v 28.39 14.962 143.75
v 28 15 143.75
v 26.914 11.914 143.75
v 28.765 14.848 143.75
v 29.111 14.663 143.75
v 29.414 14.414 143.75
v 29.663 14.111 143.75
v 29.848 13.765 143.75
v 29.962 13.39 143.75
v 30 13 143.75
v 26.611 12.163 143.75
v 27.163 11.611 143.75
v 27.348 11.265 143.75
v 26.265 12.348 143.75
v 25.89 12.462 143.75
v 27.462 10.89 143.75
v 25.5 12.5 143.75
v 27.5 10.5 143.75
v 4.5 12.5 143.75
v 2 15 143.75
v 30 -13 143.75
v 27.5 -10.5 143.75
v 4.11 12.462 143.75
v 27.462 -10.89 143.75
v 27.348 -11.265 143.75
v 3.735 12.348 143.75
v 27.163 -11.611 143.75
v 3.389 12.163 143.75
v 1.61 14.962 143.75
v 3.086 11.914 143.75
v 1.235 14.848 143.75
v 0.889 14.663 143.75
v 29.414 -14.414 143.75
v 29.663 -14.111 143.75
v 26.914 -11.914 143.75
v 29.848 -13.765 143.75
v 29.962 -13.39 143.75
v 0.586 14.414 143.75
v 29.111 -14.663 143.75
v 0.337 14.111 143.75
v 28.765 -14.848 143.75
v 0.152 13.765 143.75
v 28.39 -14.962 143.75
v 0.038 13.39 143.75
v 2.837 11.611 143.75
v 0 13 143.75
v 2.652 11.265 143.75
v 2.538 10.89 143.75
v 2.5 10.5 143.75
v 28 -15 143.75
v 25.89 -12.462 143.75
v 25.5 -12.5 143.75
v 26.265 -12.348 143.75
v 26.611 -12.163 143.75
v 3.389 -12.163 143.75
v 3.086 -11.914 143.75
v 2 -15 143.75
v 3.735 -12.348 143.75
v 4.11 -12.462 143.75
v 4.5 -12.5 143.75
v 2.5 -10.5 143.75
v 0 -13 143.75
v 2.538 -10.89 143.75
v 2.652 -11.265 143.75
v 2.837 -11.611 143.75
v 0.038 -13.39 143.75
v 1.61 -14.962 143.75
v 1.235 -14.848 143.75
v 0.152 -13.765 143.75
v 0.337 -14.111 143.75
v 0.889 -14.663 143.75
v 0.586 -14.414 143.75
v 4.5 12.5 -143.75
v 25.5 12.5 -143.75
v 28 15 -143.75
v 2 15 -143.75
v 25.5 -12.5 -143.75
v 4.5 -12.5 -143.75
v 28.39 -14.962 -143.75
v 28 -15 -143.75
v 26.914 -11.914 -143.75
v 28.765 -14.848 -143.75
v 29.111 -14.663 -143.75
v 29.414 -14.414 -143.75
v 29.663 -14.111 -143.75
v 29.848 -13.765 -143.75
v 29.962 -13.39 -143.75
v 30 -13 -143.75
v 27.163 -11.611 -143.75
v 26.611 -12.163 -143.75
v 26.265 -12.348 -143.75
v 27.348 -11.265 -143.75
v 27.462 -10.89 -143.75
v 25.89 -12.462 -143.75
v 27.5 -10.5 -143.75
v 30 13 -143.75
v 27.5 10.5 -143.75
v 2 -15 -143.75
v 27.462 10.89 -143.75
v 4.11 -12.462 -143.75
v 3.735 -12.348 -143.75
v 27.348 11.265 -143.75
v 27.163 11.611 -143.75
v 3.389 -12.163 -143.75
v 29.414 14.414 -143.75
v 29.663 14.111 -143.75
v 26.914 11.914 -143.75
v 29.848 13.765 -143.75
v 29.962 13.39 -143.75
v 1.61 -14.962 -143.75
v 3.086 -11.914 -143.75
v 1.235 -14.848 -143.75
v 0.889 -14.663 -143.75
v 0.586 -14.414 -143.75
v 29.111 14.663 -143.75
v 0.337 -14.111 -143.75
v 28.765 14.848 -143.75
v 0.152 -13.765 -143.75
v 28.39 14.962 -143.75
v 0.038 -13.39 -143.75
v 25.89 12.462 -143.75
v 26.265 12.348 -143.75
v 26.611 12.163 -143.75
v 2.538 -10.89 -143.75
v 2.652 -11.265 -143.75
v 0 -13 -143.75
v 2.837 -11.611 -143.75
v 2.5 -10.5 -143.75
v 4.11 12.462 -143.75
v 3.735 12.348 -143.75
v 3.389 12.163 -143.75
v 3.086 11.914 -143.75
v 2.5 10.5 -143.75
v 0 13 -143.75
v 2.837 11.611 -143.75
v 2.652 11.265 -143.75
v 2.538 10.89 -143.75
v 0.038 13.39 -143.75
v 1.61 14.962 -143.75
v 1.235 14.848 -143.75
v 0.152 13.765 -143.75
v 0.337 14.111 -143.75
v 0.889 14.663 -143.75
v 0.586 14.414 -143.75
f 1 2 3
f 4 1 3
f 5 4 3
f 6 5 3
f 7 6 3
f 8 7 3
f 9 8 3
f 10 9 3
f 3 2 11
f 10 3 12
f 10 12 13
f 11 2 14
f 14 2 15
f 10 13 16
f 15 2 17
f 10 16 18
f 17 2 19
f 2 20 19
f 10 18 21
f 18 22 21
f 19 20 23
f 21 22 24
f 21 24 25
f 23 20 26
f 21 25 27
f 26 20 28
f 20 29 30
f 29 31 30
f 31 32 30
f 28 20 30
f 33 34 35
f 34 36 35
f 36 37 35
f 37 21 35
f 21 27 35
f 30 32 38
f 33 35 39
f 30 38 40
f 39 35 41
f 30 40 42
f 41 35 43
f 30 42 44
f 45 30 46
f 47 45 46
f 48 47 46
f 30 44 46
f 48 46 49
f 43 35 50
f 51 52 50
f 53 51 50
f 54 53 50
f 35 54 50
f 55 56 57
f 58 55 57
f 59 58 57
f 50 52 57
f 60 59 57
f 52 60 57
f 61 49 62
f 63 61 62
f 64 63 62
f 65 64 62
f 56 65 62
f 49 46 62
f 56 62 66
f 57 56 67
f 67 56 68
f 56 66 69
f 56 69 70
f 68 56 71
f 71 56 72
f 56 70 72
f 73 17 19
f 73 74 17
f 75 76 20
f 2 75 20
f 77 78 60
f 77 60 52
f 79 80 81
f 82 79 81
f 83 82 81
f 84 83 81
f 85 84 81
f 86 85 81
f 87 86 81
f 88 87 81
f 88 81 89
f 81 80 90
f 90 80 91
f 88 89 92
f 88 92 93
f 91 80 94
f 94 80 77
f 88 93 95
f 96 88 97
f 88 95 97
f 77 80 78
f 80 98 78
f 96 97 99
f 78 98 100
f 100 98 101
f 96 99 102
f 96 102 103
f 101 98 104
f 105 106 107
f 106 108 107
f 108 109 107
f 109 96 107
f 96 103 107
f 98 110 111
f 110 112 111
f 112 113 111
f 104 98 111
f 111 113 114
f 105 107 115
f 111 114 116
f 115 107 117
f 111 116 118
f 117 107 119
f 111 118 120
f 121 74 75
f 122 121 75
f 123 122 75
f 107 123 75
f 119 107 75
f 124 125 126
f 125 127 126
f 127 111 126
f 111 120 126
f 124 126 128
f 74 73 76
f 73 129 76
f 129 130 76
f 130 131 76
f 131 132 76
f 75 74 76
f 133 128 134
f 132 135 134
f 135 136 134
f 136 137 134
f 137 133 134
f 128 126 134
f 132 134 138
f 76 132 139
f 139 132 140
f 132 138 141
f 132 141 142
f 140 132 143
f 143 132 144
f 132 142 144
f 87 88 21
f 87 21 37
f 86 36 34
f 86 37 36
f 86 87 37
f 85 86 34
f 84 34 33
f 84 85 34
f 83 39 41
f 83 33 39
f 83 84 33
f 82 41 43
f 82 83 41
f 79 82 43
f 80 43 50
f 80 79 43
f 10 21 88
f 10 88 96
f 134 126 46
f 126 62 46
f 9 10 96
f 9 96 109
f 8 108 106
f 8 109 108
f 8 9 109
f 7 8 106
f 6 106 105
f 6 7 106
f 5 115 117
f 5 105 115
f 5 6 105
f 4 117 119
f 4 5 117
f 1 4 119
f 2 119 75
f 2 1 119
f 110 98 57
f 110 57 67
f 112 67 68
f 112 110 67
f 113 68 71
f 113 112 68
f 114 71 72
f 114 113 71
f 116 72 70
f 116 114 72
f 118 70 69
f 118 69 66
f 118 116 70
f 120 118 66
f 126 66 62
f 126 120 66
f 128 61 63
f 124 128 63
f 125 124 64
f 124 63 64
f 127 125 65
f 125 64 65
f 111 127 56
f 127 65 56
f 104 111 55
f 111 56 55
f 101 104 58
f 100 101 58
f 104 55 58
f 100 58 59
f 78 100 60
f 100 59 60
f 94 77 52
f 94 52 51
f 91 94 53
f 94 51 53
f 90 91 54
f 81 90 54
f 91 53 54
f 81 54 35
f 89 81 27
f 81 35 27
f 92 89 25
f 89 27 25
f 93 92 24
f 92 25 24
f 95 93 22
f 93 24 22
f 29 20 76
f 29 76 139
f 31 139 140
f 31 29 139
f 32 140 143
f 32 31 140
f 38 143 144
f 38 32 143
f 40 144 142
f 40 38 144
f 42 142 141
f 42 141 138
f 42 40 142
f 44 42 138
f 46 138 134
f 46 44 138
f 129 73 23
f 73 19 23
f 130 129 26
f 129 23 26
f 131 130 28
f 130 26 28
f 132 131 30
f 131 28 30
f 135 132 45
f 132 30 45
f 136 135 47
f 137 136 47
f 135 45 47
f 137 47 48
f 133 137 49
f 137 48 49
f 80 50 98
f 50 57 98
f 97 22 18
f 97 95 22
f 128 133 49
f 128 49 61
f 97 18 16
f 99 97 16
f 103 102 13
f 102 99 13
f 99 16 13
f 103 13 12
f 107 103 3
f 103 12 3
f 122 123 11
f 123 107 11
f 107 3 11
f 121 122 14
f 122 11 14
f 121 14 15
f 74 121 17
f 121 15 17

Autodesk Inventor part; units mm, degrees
ref_plane "YZ Plane" through (0, 0, 0) normal (1, 0, 0) x (0, 1, 0)
ref_plane "XZ Plane" through (0, 0, 0) normal (0, 1, 0) x (-1, 0, 0)
ref_plane "XY Plane" through (0, 0, 0) normal (0, 0, 1) x (1, 0, 0)
sketch "Sketch1" plane through (0, 0, 0) normal (1, 0, 0) x (0, 1, 0)
  line L0 (15, 143.75) -> (-15, 143.75)
  line L1 (-15, 143.75) -> (-15, -143.75)
  line L2 (-15, -143.75) -> (15, -143.75)
  line L3 (15, -143.75) -> (15, 143.75)
  point P0 (0, 0)
  dimension "d0" = 287.5
  dimension "d1" = 143.75
  dimension "d2" = 30
  dimension "d3" = 15
extrude "Extrusion1" add sketch "Sketch1" along normal blind 30
fillet "Fillet1" radius 2 4 edges at (0, 15, 0) (0, -15, 0) (30, -15, 0) (30, 15, 0)
sketch "Sketch2" plane through (0, -13, -143.75) normal (0, 0, -1) x (-1, 0, 0)
  line L0 (-27.5, 25.5) -> (-2.5, 25.5)
  line L1 (-2.5, 25.5) -> (-2.5, 0.5)
  line L2 (-2.5, 0.5) -> (-27.5, 0.5)
  line L3 (-27.5, 0.5) -> (-27.5, 25.5)
  line L4 (-2, 28) -> (-28, 28) projected
  line L5 (-2, -2) -> (-28, -2) projected
  line L6 (0, 0) -> (0, 26) projected
  line L7 (-30, 0) -> (-30, 26) projected
  point P0 (0, 13)
  dimension "d7" = 2.5
  dimension "d8" = 2.5
  dimension "d9" = 2.5
  dimension "d10" = 2.5
extrude "Extrusion2" cut sketch "Sketch2" against normal blind 300
fillet "Fillet2" radius 2 4 edges at (27.5, -12.5, 0) (27.5, 12.5, 0) (2.5, 12.5, 0) (2.5, -12.5, 0)
equation "\"d0\" = 0.5 * wheelchair_deployed_width - secure_arm_hold_thickness"
equation "\"d1\" = 0.5 * d0"
equation "\"d2\" = secure_arm_hold_thickness"
equation "\"d3\" = 0.5 * d2"
equation "\"d4\" = secure_arm_hold_thickness"
equation "\"hoop_angle_z\" = 45deg"
equation "\"hoop_bearing_length\" = 5deg"
equation "\"hoop_cable_diam\" = 5"
equation "\"hoop_cable_pulley_diam\" = 22"
equation "\"hoop_thickness_large\" = 4"
equation "\"hoop_thickness_medium\" = 3.2"
equation "\"hoop_thickness_small\" = 2"
equation "\"hoop_width_large\" = 51"
equation "\"hoop_width_medium\" = 33.7"
equation "\"hoop_width_small\" = 25.4"
equation "\"rack_tooth_addendum\" = 5"
equation "\"rack_tooth_dedendum\" = 5"
equation "\"rack_tooth_thickness\" = 5"
equation "\"secure_arm_angle\" = 35deg"
equation "\"secure_arm_hold_thickness\" = 30"
equation "\"secure_arm_radii\" = 9"
equation "\"support_baseClamp_platformLengthBuffer\" = 35"
equation "\"support_baseClamp_platformThickness\" = 15"
equation "\"support_baseClamp_platformWidthBuffer\" = 0"
equation "\"support_baseClamp_sleeveHoleDiameter\" = 12"
equation "\"support_baseClamp_sleeveSweepTerminationAngle\" = 55deg"
equation "\"support_baseClamp_thickness\" = 8"
equation "\"support_frame_endHoleBuffer\" = 45"
equation "\"support_frame_squareBarFillet\" = 2"
equation "\"support_frame_squareBarThickness\" = 5"
equation "\"hoop_tabs_thickness\" = 6"
equation "\"hoop_tabs_hole\" = 12"
equation "\"wheelchair_deployed_width\" = 635"
equation "\"wheelchair_deployed_height\" = 914"
equation "\"wheelchair_deployed_length\" = 1067"
equation "\"sm_varx_pinPlate_thickness\" = 5"
equation "\"sm_varx_member_tolerance\" = 0"
equation "\"sm_varx_pinPlate_holeDiameter\" = 5"
equation "\"sm_varx_squareBarThickness\" = 2.5"
equation "\"hoop_bushing23_radialInterference\" = 0"
equation "\"hoop_bushing12_radialInterference\" = 0"
equation "\"hoop_bushing12_od\" = -2 * hoop_thickness_large + hoop_width_large + hoop_bushing12_radialInterference"
equation "\"hoop_bushing23_od\" = -2 * hoop_thickness_medium + hoop_width_medium + hoop_bushing23_radialInterference"
equation "\"wheelchatir_pos_deploy_angle_0\" = 65deg"
equation "\"wheelchatir_pos_store_angle_0\" = 90deg"
equation "\"wheelchatir_pos_deploy_angle_1\" = 20deg"
equation "\"wheelchatir_pos_store_angle_1\" = 20deg"
equation "\"hoop_bushing12_thickness\" = -hoop_width_medium + hoop_bushing12_od - 2 * hoop_bushing12_radialInterference"
equation "\"hoop_bushing23_thickness\" = -hoop_width_small + hoop_bushing23_od - 2 * hoop_bushing23_radialInterference"
properties part number "secure_width_bar"
